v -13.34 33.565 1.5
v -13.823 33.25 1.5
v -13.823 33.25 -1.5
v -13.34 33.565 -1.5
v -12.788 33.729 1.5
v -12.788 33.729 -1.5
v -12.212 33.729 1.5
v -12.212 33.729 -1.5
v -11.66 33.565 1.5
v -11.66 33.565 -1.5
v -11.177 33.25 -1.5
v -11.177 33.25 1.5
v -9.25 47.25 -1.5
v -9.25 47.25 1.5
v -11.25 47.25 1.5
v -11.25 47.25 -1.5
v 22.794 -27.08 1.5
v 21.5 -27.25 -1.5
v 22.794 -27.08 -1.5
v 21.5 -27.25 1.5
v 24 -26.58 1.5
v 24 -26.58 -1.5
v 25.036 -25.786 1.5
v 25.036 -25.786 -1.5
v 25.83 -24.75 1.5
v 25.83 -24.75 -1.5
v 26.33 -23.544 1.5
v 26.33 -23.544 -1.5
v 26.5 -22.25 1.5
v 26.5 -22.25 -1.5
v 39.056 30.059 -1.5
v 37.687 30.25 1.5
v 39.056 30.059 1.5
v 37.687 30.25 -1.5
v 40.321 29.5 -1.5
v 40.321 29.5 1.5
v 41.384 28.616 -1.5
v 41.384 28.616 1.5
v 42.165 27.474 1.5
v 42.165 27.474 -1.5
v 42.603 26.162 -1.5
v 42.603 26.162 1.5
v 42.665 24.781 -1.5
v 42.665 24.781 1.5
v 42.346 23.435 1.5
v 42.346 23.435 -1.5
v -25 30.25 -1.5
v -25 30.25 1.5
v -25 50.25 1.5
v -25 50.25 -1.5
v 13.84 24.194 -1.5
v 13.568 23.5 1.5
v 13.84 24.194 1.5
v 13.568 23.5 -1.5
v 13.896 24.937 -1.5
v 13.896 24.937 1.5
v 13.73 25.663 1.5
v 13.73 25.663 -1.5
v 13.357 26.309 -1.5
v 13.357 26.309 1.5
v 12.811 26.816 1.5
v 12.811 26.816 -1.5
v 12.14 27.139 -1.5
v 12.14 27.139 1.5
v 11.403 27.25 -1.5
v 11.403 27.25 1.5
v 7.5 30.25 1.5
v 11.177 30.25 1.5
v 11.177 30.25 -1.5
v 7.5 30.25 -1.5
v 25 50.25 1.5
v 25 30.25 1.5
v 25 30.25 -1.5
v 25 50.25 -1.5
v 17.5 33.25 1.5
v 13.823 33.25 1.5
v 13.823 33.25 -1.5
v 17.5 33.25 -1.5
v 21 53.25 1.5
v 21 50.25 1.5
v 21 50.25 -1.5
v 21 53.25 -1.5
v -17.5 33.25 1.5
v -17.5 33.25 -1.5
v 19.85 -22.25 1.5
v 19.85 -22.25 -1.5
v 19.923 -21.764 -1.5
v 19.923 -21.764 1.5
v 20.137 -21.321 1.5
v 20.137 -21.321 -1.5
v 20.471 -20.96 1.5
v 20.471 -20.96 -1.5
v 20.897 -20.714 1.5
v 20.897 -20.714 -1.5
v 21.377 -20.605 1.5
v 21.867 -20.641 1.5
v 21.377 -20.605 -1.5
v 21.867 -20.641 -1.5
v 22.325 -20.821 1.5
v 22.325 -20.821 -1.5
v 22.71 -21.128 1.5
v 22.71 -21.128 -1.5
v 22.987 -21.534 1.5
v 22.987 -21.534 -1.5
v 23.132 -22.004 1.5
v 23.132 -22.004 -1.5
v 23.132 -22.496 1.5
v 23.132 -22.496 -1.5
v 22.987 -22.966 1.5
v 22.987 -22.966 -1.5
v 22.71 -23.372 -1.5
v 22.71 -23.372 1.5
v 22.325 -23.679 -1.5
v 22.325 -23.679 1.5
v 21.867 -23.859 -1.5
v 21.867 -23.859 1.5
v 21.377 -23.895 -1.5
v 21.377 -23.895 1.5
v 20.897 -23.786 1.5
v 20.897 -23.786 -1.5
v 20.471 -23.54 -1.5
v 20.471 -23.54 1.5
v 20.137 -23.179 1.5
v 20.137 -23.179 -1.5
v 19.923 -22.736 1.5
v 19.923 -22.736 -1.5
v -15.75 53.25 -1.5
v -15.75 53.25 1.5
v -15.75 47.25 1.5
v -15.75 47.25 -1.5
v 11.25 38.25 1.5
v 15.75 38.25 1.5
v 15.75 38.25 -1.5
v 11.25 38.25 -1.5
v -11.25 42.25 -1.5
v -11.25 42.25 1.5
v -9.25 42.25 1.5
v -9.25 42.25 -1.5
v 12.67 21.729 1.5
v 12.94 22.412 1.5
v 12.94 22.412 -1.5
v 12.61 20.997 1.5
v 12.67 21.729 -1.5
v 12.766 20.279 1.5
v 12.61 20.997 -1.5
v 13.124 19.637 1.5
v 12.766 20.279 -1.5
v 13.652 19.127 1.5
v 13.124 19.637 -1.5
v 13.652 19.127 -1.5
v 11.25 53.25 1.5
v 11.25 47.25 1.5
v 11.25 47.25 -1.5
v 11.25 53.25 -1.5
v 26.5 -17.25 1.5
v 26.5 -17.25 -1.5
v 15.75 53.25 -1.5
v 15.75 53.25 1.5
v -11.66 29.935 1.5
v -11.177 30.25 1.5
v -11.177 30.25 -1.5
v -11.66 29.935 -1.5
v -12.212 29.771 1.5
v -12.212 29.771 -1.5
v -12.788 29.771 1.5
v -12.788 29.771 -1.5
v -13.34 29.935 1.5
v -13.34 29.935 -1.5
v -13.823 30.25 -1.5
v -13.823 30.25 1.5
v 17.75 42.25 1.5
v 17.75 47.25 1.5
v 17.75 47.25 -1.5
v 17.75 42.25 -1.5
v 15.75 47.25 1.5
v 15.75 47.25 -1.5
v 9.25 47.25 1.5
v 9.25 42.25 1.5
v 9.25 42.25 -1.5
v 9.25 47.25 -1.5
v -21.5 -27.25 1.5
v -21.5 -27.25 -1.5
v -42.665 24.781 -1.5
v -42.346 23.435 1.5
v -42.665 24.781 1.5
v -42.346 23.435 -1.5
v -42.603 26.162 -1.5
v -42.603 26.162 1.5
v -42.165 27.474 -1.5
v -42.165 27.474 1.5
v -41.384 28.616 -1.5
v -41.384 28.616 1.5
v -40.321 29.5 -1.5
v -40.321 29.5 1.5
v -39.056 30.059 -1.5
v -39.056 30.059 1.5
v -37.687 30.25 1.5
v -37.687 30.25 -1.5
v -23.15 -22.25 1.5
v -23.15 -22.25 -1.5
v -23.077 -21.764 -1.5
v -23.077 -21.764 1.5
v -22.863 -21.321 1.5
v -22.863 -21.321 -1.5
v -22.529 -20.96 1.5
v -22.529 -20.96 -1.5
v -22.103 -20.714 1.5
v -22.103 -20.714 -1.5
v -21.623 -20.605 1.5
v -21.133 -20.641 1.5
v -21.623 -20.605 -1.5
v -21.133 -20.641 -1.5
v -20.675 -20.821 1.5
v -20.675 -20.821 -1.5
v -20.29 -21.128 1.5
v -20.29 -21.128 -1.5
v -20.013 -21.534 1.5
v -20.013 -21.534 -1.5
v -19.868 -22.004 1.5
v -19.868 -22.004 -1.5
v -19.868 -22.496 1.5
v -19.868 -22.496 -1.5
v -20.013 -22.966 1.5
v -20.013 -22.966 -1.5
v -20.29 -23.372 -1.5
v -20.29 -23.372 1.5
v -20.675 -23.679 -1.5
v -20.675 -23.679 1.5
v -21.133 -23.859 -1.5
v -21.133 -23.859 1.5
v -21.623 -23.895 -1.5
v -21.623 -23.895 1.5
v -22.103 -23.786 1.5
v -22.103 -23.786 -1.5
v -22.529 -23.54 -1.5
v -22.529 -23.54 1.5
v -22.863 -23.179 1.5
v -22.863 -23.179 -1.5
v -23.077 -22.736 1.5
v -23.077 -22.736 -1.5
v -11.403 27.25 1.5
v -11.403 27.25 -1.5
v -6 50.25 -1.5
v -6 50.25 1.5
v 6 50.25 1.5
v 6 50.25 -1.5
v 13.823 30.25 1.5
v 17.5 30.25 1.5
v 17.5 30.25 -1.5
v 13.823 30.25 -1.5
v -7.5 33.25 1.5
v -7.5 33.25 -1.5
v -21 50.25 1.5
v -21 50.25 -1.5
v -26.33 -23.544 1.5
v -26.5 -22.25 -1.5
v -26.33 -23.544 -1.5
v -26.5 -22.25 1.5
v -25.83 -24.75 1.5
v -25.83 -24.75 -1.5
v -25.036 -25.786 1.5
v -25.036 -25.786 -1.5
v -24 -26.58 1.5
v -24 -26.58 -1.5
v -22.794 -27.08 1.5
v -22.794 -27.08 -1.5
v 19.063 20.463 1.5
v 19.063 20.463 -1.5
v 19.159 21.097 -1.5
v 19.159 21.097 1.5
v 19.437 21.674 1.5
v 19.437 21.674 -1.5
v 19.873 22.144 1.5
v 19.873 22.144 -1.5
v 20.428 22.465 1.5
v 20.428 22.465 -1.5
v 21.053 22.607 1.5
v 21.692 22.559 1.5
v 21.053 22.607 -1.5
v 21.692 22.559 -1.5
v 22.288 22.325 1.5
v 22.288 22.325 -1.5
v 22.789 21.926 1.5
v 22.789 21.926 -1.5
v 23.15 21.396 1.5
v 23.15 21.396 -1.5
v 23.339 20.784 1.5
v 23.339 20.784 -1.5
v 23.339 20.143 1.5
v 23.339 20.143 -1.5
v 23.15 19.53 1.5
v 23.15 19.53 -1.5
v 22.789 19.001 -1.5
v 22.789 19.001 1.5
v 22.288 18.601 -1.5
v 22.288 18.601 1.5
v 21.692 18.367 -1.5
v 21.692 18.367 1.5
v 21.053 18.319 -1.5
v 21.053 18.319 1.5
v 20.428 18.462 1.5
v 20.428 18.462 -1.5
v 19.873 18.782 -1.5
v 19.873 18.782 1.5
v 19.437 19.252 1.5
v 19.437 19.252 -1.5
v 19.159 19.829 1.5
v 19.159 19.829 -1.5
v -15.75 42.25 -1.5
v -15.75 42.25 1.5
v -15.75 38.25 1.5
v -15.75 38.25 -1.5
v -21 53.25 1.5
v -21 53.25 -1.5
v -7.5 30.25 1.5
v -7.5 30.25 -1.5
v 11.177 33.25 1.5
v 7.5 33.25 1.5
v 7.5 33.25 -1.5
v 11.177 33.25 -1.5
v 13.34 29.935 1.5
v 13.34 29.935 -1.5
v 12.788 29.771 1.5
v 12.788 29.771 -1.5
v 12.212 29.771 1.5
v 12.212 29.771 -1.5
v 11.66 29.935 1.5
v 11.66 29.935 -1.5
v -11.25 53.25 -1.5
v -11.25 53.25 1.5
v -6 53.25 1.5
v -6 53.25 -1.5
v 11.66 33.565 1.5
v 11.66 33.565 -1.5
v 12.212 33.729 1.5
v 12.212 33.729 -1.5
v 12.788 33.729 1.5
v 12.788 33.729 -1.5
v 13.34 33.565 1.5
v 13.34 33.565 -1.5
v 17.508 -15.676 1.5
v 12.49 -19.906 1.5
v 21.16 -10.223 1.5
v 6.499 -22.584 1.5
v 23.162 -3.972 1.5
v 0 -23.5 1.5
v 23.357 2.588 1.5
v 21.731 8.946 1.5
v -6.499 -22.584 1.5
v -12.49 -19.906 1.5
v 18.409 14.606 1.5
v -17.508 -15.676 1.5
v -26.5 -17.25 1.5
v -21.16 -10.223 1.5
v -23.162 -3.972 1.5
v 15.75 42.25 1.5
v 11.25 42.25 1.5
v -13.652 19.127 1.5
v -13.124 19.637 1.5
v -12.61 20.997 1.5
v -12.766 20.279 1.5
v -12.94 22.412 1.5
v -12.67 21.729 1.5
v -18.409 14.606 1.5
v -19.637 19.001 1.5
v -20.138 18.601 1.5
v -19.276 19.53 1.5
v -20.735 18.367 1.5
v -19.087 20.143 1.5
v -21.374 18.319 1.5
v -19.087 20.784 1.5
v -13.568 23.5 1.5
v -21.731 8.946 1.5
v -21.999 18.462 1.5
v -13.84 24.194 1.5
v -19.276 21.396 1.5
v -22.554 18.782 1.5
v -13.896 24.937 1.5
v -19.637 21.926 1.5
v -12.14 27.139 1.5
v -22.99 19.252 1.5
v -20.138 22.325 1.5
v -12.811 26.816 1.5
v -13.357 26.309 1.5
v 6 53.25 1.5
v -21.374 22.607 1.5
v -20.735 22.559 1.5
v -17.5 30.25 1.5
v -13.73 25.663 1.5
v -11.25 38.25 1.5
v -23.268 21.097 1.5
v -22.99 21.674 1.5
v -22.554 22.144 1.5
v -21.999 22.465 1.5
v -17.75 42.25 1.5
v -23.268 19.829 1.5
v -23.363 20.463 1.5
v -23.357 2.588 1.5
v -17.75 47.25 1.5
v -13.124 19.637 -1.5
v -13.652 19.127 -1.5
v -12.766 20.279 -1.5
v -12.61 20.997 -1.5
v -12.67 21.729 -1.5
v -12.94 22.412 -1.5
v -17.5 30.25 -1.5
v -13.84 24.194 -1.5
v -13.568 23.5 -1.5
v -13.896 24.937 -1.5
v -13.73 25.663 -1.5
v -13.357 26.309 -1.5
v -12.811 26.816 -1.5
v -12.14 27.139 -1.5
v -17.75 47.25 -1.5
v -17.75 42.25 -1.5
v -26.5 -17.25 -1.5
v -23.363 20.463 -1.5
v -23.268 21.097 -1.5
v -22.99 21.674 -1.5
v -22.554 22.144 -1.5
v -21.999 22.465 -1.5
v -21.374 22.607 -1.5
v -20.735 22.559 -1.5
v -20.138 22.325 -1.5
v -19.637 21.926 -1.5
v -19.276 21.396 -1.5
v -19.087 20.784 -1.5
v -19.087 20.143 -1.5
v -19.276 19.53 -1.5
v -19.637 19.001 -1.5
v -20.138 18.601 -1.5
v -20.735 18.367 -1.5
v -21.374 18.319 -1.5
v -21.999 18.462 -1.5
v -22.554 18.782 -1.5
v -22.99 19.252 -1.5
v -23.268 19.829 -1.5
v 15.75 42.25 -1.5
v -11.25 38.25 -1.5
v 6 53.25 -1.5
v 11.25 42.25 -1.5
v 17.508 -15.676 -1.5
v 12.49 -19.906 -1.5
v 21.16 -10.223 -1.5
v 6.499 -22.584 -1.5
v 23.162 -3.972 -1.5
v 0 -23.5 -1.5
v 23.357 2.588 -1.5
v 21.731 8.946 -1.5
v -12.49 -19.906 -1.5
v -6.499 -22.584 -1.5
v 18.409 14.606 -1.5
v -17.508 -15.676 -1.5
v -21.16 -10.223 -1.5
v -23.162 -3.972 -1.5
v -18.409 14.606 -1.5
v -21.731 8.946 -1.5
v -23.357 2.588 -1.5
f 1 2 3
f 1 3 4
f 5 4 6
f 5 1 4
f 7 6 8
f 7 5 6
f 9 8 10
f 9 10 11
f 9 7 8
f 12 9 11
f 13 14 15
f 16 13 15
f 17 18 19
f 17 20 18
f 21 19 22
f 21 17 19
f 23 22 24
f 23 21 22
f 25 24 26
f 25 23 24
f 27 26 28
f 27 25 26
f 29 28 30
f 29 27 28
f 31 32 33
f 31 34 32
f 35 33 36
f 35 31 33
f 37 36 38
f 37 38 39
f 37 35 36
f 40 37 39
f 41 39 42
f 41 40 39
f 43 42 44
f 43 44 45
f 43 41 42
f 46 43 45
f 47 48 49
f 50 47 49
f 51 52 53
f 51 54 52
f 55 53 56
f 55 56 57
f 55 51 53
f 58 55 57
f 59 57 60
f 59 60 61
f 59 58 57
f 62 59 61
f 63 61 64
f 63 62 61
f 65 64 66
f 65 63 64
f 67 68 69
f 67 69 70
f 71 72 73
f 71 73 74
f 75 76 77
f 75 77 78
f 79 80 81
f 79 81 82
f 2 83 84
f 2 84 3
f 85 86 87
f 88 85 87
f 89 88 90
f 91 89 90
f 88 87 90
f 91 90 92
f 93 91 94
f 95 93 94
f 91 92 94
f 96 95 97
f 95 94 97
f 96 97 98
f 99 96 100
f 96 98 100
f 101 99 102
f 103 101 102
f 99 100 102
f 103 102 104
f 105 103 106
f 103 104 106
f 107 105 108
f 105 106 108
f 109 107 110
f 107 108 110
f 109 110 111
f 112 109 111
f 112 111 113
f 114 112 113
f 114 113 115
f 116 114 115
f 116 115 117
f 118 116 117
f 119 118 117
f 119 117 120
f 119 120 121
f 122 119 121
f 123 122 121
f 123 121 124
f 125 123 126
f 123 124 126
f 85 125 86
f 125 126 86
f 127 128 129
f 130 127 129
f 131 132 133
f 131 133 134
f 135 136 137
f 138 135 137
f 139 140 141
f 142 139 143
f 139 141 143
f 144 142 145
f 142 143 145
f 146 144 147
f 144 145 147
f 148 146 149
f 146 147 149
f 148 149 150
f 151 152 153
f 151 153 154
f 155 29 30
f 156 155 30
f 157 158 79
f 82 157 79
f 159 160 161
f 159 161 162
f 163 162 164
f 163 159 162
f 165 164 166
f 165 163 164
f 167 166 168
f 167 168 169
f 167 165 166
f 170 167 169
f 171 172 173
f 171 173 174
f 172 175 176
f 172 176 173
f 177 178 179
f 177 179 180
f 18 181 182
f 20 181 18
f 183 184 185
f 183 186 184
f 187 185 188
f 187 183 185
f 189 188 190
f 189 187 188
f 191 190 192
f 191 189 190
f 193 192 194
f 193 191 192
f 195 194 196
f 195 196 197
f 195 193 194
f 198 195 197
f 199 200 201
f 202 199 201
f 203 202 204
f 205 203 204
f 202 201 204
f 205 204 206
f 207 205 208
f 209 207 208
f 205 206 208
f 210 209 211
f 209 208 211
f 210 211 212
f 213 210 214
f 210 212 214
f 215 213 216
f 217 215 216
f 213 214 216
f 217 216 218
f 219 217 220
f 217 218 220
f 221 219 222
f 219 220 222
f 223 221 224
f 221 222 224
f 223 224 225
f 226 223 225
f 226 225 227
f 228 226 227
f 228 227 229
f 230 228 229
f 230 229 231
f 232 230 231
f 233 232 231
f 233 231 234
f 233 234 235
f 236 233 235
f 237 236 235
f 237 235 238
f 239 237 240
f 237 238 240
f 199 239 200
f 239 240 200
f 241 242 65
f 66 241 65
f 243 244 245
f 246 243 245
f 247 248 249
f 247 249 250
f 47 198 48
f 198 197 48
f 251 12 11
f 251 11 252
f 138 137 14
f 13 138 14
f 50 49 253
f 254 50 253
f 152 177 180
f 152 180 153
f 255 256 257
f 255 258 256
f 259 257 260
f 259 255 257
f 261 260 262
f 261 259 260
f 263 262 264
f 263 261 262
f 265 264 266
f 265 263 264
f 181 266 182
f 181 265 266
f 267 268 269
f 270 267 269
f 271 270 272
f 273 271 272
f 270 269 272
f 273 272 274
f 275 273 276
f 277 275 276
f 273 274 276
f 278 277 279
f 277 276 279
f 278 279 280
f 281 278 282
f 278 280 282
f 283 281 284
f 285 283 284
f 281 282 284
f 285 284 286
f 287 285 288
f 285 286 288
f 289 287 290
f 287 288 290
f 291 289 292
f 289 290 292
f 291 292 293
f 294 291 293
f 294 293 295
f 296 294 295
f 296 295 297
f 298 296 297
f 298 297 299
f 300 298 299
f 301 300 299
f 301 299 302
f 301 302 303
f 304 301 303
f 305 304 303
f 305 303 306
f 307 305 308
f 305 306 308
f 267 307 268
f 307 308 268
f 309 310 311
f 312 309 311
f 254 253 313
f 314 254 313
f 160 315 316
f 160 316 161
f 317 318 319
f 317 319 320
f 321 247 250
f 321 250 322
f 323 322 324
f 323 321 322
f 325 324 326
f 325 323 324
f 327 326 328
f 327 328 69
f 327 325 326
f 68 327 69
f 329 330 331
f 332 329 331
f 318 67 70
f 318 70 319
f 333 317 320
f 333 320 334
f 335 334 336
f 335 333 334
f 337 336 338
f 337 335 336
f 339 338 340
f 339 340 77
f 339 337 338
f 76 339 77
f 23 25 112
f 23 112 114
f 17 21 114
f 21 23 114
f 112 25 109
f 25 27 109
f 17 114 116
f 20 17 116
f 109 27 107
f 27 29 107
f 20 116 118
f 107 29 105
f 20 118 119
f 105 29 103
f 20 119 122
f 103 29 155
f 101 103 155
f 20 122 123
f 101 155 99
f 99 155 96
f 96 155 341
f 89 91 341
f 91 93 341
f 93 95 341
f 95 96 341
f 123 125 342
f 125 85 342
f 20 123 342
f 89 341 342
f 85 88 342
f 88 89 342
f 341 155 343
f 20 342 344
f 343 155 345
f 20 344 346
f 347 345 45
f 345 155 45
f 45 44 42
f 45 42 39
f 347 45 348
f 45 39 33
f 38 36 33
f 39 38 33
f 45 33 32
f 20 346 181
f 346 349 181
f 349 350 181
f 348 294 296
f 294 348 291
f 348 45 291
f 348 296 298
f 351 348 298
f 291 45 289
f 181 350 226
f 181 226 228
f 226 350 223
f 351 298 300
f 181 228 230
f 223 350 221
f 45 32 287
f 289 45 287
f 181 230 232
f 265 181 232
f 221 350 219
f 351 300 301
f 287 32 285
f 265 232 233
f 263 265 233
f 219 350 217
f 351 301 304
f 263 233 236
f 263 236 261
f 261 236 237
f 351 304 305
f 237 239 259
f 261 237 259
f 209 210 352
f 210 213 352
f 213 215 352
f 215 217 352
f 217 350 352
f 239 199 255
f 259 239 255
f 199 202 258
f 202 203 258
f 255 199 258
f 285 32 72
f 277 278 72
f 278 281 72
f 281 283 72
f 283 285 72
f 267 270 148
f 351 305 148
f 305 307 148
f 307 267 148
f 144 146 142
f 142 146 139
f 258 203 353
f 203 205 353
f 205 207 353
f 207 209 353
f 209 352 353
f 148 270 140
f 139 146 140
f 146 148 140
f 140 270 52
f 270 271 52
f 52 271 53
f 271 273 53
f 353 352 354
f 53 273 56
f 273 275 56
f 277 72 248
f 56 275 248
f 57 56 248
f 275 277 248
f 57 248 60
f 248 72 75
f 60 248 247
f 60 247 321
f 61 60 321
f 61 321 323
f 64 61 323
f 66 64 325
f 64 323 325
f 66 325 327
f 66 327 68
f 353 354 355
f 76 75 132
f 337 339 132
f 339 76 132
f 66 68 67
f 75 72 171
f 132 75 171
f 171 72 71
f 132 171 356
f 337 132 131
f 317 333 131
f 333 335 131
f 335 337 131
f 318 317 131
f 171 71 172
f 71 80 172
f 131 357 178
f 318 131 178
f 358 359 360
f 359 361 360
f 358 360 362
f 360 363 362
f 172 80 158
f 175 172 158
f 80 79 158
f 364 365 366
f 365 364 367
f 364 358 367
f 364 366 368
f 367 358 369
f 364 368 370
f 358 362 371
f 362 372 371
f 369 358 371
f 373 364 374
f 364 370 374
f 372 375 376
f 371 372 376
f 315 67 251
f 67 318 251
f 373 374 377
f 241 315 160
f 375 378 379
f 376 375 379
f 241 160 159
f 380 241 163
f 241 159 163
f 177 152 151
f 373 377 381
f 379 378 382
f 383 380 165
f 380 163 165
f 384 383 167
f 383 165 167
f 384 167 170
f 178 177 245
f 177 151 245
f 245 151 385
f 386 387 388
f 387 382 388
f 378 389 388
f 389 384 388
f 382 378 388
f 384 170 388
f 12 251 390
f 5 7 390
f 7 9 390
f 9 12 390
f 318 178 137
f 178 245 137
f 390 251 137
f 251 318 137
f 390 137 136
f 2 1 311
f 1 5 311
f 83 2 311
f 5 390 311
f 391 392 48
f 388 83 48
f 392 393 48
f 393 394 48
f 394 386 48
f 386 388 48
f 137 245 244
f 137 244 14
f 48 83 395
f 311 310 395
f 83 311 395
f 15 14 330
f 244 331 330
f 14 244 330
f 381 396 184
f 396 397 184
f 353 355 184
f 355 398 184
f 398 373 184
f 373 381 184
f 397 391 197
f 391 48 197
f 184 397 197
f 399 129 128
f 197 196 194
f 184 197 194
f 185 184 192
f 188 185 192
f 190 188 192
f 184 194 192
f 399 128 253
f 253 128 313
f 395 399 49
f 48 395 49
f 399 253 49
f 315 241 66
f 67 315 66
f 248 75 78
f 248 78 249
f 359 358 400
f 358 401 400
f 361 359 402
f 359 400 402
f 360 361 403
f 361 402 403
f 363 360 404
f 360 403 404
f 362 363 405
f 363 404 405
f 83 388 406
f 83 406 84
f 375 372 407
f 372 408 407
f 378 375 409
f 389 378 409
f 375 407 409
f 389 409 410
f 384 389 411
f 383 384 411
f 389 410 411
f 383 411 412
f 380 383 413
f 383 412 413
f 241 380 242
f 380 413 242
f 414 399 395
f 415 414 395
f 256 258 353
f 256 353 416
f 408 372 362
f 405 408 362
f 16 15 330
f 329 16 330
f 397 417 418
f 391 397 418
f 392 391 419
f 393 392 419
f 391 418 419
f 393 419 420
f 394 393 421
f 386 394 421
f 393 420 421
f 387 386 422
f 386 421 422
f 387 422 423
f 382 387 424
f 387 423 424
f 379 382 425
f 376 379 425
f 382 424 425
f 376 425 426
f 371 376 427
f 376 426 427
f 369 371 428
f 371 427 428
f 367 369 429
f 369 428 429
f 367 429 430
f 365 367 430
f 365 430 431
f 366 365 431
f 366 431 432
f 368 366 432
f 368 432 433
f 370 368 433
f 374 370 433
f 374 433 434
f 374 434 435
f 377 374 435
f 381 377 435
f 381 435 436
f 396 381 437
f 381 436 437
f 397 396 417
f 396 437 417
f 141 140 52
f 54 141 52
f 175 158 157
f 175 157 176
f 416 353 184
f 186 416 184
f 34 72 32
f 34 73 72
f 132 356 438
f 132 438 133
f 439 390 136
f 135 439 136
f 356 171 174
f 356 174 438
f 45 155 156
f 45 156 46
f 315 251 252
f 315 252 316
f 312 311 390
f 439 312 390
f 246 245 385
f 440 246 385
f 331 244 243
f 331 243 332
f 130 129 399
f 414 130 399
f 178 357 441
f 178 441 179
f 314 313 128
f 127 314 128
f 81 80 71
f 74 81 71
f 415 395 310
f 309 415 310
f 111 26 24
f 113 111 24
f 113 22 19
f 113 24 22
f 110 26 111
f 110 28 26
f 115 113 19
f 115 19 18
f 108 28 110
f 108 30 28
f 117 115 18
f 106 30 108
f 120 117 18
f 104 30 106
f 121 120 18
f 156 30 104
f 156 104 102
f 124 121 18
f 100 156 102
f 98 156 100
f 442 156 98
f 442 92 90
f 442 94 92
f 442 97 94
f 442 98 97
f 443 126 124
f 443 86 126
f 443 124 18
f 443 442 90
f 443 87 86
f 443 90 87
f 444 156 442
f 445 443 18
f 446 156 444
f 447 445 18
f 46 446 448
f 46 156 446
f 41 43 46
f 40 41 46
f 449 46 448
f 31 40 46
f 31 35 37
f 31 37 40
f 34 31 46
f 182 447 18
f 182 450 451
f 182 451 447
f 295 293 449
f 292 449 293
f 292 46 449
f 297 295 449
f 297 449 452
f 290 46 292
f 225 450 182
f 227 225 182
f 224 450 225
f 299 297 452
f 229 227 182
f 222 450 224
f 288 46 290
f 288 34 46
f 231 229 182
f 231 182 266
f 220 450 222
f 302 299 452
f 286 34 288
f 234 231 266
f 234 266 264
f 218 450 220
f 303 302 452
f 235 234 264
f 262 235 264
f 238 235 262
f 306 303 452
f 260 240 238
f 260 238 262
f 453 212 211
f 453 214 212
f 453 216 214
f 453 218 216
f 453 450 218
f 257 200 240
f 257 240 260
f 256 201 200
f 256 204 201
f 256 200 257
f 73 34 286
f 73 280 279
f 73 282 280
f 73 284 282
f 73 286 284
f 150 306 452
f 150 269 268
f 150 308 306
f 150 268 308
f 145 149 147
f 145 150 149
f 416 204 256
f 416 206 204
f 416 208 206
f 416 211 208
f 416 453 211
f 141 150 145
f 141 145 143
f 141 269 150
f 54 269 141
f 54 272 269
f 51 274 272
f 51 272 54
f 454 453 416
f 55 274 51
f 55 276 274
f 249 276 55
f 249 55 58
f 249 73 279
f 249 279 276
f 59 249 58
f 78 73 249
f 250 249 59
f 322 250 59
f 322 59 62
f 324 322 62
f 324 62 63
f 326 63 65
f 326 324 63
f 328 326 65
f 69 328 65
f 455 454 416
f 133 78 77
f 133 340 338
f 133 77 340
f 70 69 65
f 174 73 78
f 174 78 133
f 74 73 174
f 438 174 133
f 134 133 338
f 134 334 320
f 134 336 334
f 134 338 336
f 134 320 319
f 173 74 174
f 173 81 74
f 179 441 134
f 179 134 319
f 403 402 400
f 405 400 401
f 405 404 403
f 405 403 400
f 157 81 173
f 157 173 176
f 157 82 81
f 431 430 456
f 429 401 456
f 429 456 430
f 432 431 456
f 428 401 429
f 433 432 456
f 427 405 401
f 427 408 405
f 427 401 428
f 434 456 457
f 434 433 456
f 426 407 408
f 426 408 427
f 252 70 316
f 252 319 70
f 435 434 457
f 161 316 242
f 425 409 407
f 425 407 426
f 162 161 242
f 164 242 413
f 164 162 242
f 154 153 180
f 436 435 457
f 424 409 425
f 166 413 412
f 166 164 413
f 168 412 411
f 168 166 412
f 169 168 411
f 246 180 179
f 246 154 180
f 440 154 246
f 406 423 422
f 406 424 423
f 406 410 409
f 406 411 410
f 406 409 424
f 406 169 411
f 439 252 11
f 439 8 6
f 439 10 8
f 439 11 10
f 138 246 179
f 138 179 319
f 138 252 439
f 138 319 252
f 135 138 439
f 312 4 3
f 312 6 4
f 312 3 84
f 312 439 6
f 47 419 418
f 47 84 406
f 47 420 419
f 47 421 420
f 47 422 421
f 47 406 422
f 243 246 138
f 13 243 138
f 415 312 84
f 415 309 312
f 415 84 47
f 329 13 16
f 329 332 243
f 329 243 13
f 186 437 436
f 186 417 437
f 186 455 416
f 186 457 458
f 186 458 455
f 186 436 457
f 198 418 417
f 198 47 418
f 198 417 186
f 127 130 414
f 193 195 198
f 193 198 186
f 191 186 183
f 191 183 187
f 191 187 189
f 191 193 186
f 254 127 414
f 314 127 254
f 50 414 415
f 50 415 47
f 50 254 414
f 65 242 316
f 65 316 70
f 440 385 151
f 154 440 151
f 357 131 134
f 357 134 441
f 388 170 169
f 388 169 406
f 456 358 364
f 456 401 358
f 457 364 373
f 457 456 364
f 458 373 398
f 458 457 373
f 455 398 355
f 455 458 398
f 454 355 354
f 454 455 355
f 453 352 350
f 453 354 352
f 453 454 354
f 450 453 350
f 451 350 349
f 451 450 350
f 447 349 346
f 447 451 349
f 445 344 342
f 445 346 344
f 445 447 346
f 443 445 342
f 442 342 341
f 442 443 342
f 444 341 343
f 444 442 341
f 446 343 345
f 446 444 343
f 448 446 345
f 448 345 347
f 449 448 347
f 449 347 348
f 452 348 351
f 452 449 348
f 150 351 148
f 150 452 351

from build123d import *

# Parameters (mm, degrees)
SKETCH_1_W           = 53
SKETCH_1_H           = 54.5
SKETCH_1_R           = 23.5
EXTRUDE_1_DEPTH      = 1.5
SKETCH_2_R           = 1.65
SKETCH_2_R_2         = 2.15
CUT_EXTRUDE_1_DEPTH  = 3
FILLET_1_R           = 5
CUT_EXTRUDE_2_DEPTH  = 5
SKETCH_4_W           = 53
SKETCH_4_H           = 3
EXTRUDE_2_DEPTH      = 3
FILLET_2_R           = 2.5
SKETCH_5_W           = 50
SKETCH_5_H           = 20
EXTRUDE_3_DEPTH      = 3
CUT_EXTRUDE_9_DEPTH  = 3
FILLET_3_R           = 5
SKETCH_8_W           = 15
SKETCH_8_H           = 3
EXTRUDE_4_DEPTH      = 3
CUT_EXTRUDE_10_DEPTH = 3


with BuildPart() as part:
    # 草图1 → 凸台-拉伸1 (new, symmetric)
    with BuildSketch(Plane.XY):
        Rectangle(SKETCH_1_W, SKETCH_1_H)
        Circle(SKETCH_1_R, mode=Mode.SUBTRACT)
    extrude(amount=EXTRUDE_1_DEPTH, both=True)

    # 草图2 → 切除-拉伸1 (cut)
    with BuildSketch(Plane(origin=(0, 0, -1.5), x_dir=(-1, 0, 0), z_dir=(0, 0, -1))):
        with Locations((-21.5, -22.25)):
            Circle(SKETCH_2_R)
        with Locations((-21.213203436, 20.463203436)):
            Circle(SKETCH_2_R_2)
        with Locations((21.5, -22.25)):
            Circle(SKETCH_2_R)
        with Locations((21.213203436, 20.463203436)):
            Circle(SKETCH_2_R_2)
    extrude(amount=-CUT_EXTRUDE_1_DEPTH, mode=Mode.SUBTRACT)

    # 圆角1
    fillet_1_edges = [part.edges().sort_by_distance(p)[0] for p in [
        (26.5, -27.25, 0),
        (-26.5, -27.25, 0),
    ]]
    fillet(fillet_1_edges, radius=FILLET_1_R)

    # 草图3 → 切除-拉伸2 (cut)
    with BuildSketch(Plane.XY.offset(1.5)):
        Polygon((0, 0), (15.732794835, 27.25), (-15.732794835, 27.25), align=None)
    extrude(amount=-CUT_EXTRUDE_2_DEPTH, mode=Mode.SUBTRACT)

    # 草图4 → 凸台-拉伸2 (add)
    with BuildSketch(Plane(origin=(0, 27.25, 0), x_dir=(1, 0, 0), z_dir=(0, 1, 0))):
        Rectangle(SKETCH_4_W, SKETCH_4_H)
    extrude(amount=EXTRUDE_2_DEPTH)

    # 圆角2
    fillet_2_edges = [part.edges().sort_by_distance(p)[0] for p in [
        (11.75, 20.351596989, 0),
        (-11.75, 20.351596989, 0),
        (-15.732794835, 27.25, 0),
        (15.732794835, 27.25, 0),
    ]]
    fillet(fillet_2_edges, radius=FILLET_2_R)

    # 草图5 → 凸台-拉伸3 (add)
    with BuildSketch(Plane.XY.offset(1.5)):
        Polygon((-26.5, -17.25), (-45, 30.25), (-26.5, 30.25), align=None)
        Polygon((26.5, -17.25), (45, 30.25), (26.5, 30.25), align=None)
        with Locations((0, 40.25)):
            Rectangle(SKETCH_5_W, SKETCH_5_H)
    extrude(amount=-EXTRUDE_3_DEPTH)

    # 草图6 → 切除-拉伸9 (cut)
    with BuildSketch(Plane.XY.offset(1.5)):
        with BuildLine():
            Line((-11.177124344, 33.25), (-7.5, 33.25))
            Line((-7.5, 33.25), (-7.5, 30.25))
            Line((-7.5, 30.25), (-11.177124344, 30.25))
            ThreePointArc((-11.177124344, 30.25), (-12.5, 29.75), (-13.822875656, 30.25))
            Line((-13.822875656, 30.25), (-17.5, 30.25))
            Line((-17.5, 30.25), (-17.5, 33.25))
            Line((-17.5, 33.25), (-13.822875656, 33.25))
            ThreePointArc((-13.822875656, 33.25), (-12.5, 33.75), (-11.177124344, 33.25))
        make_face()
        with BuildLine():
            Line((13.822875656, 33.25), (17.5, 33.25))
            Line((17.5, 33.25), (17.5, 30.25))
            Line((17.5, 30.25), (13.822875656, 30.25))
            ThreePointArc((13.822875656, 30.25), (12.5, 29.75), (11.177124344, 30.25))
            Line((11.177124344, 30.25), (7.5, 30.25))
            Line((7.5, 30.25), (7.5, 33.25))
            Line((7.5, 33.25), (11.177124344, 33.25))
            ThreePointArc((11.177124344, 33.25), (12.5, 33.75), (13.822875656, 33.25))
        make_face()
    extrude(amount=-CUT_EXTRUDE_9_DEPTH, mode=Mode.SUBTRACT)

    # 圆角3
    fillet_3_edges = [part.edges().sort_by_distance(p)[0] for p in [
        (-45, 30.25, 0),
        (45, 30.25, 0),
    ]]
    fillet(fillet_3_edges, radius=FILLET_3_R)

    # 草图8 → 凸台-拉伸4 (add)
    with BuildSketch(Plane.XY.offset(1.5)):
        with Locations((-13.5, 51.75)):
            Rectangle(SKETCH_8_W, SKETCH_8_H)
        with Locations((13.5, 51.75)):
            Rectangle(SKETCH_8_W, SKETCH_8_H)
    extrude(amount=-EXTRUDE_4_DEPTH)

    # 草图9 → 切除-拉伸10 (cut)
    with BuildSketch(Plane.XY.offset(1.5)):
        Polygon((-15.75, 53.25), (-15.75, 47.25), (-17.75, 47.25), (-17.75, 42.25), (-15.75, 42.25), (-15.75, 38.25), (-11.25, 38.25), (-11.25, 42.25), (-9.25, 42.25), (-9.25, 47.25), (-11.25, 47.25), (-11.25, 53.25), align=None)
        Polygon((11.25, 47.25), (11.25, 53.25), (15.75, 53.25), (15.75, 47.25), (17.75, 47.25), (17.75, 42.25), (15.75, 42.25), (15.75, 38.25), (11.25, 38.25), (11.25, 42.25), (9.25, 42.25), (9.25, 47.25), align=None)
    extrude(amount=-CUT_EXTRUDE_10_DEPTH, mode=Mode.SUBTRACT)


solid = part.part
